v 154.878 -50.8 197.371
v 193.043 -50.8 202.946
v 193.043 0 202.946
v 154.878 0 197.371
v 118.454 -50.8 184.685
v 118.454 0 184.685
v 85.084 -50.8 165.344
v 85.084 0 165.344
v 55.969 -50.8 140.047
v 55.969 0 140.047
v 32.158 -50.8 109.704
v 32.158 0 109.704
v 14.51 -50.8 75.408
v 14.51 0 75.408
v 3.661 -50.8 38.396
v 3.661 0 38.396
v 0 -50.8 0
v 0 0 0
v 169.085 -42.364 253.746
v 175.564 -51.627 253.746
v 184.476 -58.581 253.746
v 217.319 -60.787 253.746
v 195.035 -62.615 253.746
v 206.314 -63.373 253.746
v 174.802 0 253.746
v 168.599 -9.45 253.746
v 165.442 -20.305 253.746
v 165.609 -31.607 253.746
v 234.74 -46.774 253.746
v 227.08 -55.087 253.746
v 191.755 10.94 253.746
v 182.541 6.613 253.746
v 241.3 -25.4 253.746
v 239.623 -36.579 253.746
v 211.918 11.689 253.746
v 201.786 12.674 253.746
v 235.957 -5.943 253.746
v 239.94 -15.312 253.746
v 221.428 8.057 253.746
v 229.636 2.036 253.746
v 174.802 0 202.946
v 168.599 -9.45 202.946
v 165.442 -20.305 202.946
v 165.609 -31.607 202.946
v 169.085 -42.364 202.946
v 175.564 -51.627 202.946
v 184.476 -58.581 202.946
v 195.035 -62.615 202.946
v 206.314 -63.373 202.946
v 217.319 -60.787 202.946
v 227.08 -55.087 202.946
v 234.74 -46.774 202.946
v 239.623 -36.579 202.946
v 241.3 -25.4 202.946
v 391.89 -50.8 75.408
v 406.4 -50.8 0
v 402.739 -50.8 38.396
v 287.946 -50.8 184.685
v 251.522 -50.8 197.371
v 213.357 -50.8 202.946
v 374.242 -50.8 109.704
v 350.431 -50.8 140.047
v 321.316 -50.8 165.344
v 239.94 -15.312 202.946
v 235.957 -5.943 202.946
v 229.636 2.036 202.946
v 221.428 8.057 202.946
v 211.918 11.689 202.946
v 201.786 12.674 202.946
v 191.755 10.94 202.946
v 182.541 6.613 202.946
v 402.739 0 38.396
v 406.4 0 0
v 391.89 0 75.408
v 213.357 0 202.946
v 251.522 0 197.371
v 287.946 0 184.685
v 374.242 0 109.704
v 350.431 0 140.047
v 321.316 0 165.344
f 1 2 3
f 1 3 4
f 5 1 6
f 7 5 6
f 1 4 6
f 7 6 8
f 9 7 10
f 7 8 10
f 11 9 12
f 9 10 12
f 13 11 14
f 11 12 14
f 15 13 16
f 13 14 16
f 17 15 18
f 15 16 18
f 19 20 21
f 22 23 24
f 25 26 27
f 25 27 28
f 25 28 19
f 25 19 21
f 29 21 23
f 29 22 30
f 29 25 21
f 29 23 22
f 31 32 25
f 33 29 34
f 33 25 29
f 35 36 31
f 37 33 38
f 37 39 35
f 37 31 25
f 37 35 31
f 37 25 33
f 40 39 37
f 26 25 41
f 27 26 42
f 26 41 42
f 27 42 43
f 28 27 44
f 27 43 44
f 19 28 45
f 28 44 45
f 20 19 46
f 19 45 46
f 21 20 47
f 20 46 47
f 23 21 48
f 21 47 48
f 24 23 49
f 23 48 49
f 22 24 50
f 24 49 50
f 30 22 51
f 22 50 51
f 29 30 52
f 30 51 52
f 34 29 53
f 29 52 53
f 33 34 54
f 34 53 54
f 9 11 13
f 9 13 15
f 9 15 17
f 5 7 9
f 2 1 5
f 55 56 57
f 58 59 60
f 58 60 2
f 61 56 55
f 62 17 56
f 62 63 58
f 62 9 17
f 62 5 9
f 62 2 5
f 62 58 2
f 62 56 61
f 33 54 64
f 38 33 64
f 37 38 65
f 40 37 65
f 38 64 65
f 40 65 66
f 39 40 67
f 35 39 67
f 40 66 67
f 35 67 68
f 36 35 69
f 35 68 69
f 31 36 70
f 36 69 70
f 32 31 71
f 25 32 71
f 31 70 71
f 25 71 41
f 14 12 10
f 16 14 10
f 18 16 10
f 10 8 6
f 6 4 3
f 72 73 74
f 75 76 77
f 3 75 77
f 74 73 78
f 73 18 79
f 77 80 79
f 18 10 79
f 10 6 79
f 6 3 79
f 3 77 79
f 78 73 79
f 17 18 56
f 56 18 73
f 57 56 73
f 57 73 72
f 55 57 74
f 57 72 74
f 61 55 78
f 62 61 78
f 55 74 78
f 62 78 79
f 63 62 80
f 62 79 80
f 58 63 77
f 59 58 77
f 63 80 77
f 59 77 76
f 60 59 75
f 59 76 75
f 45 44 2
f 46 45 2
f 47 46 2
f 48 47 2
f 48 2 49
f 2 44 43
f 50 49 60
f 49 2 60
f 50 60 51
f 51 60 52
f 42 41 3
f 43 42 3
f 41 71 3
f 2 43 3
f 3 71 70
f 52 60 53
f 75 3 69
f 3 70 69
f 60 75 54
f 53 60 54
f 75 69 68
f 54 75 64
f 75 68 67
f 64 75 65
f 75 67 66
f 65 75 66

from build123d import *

# Parameters (mm, degrees)
F1_DEPTH = 50.8
F4_DEPTH = 50.8


with BuildPart() as f1:
    # F0 (on Front) → F1 (new body)
    with BuildSketch(Plane.XZ):
        with BuildLine():
            ThreePointArc((406.4, 0), (203.2, 203.2), (0, 0))
            Line((0, 0), (406.4, 0))
        make_face()
    extrude(amount=F1_DEPTH)

    # F3 (on offset) → F4 (join)
    with BuildSketch(Plane.XY.offset(202.946)):
        with BuildLine():
            ThreePointArc((174.801937, 0), (189.605078, -60.991967), (241.3, -25.4))
            ThreePointArc((241.3, -25.4), (216.794922, 10.191967), (174.801937, 0))
        make_face()
    extrude(amount=F4_DEPTH)


solid = f1.part
